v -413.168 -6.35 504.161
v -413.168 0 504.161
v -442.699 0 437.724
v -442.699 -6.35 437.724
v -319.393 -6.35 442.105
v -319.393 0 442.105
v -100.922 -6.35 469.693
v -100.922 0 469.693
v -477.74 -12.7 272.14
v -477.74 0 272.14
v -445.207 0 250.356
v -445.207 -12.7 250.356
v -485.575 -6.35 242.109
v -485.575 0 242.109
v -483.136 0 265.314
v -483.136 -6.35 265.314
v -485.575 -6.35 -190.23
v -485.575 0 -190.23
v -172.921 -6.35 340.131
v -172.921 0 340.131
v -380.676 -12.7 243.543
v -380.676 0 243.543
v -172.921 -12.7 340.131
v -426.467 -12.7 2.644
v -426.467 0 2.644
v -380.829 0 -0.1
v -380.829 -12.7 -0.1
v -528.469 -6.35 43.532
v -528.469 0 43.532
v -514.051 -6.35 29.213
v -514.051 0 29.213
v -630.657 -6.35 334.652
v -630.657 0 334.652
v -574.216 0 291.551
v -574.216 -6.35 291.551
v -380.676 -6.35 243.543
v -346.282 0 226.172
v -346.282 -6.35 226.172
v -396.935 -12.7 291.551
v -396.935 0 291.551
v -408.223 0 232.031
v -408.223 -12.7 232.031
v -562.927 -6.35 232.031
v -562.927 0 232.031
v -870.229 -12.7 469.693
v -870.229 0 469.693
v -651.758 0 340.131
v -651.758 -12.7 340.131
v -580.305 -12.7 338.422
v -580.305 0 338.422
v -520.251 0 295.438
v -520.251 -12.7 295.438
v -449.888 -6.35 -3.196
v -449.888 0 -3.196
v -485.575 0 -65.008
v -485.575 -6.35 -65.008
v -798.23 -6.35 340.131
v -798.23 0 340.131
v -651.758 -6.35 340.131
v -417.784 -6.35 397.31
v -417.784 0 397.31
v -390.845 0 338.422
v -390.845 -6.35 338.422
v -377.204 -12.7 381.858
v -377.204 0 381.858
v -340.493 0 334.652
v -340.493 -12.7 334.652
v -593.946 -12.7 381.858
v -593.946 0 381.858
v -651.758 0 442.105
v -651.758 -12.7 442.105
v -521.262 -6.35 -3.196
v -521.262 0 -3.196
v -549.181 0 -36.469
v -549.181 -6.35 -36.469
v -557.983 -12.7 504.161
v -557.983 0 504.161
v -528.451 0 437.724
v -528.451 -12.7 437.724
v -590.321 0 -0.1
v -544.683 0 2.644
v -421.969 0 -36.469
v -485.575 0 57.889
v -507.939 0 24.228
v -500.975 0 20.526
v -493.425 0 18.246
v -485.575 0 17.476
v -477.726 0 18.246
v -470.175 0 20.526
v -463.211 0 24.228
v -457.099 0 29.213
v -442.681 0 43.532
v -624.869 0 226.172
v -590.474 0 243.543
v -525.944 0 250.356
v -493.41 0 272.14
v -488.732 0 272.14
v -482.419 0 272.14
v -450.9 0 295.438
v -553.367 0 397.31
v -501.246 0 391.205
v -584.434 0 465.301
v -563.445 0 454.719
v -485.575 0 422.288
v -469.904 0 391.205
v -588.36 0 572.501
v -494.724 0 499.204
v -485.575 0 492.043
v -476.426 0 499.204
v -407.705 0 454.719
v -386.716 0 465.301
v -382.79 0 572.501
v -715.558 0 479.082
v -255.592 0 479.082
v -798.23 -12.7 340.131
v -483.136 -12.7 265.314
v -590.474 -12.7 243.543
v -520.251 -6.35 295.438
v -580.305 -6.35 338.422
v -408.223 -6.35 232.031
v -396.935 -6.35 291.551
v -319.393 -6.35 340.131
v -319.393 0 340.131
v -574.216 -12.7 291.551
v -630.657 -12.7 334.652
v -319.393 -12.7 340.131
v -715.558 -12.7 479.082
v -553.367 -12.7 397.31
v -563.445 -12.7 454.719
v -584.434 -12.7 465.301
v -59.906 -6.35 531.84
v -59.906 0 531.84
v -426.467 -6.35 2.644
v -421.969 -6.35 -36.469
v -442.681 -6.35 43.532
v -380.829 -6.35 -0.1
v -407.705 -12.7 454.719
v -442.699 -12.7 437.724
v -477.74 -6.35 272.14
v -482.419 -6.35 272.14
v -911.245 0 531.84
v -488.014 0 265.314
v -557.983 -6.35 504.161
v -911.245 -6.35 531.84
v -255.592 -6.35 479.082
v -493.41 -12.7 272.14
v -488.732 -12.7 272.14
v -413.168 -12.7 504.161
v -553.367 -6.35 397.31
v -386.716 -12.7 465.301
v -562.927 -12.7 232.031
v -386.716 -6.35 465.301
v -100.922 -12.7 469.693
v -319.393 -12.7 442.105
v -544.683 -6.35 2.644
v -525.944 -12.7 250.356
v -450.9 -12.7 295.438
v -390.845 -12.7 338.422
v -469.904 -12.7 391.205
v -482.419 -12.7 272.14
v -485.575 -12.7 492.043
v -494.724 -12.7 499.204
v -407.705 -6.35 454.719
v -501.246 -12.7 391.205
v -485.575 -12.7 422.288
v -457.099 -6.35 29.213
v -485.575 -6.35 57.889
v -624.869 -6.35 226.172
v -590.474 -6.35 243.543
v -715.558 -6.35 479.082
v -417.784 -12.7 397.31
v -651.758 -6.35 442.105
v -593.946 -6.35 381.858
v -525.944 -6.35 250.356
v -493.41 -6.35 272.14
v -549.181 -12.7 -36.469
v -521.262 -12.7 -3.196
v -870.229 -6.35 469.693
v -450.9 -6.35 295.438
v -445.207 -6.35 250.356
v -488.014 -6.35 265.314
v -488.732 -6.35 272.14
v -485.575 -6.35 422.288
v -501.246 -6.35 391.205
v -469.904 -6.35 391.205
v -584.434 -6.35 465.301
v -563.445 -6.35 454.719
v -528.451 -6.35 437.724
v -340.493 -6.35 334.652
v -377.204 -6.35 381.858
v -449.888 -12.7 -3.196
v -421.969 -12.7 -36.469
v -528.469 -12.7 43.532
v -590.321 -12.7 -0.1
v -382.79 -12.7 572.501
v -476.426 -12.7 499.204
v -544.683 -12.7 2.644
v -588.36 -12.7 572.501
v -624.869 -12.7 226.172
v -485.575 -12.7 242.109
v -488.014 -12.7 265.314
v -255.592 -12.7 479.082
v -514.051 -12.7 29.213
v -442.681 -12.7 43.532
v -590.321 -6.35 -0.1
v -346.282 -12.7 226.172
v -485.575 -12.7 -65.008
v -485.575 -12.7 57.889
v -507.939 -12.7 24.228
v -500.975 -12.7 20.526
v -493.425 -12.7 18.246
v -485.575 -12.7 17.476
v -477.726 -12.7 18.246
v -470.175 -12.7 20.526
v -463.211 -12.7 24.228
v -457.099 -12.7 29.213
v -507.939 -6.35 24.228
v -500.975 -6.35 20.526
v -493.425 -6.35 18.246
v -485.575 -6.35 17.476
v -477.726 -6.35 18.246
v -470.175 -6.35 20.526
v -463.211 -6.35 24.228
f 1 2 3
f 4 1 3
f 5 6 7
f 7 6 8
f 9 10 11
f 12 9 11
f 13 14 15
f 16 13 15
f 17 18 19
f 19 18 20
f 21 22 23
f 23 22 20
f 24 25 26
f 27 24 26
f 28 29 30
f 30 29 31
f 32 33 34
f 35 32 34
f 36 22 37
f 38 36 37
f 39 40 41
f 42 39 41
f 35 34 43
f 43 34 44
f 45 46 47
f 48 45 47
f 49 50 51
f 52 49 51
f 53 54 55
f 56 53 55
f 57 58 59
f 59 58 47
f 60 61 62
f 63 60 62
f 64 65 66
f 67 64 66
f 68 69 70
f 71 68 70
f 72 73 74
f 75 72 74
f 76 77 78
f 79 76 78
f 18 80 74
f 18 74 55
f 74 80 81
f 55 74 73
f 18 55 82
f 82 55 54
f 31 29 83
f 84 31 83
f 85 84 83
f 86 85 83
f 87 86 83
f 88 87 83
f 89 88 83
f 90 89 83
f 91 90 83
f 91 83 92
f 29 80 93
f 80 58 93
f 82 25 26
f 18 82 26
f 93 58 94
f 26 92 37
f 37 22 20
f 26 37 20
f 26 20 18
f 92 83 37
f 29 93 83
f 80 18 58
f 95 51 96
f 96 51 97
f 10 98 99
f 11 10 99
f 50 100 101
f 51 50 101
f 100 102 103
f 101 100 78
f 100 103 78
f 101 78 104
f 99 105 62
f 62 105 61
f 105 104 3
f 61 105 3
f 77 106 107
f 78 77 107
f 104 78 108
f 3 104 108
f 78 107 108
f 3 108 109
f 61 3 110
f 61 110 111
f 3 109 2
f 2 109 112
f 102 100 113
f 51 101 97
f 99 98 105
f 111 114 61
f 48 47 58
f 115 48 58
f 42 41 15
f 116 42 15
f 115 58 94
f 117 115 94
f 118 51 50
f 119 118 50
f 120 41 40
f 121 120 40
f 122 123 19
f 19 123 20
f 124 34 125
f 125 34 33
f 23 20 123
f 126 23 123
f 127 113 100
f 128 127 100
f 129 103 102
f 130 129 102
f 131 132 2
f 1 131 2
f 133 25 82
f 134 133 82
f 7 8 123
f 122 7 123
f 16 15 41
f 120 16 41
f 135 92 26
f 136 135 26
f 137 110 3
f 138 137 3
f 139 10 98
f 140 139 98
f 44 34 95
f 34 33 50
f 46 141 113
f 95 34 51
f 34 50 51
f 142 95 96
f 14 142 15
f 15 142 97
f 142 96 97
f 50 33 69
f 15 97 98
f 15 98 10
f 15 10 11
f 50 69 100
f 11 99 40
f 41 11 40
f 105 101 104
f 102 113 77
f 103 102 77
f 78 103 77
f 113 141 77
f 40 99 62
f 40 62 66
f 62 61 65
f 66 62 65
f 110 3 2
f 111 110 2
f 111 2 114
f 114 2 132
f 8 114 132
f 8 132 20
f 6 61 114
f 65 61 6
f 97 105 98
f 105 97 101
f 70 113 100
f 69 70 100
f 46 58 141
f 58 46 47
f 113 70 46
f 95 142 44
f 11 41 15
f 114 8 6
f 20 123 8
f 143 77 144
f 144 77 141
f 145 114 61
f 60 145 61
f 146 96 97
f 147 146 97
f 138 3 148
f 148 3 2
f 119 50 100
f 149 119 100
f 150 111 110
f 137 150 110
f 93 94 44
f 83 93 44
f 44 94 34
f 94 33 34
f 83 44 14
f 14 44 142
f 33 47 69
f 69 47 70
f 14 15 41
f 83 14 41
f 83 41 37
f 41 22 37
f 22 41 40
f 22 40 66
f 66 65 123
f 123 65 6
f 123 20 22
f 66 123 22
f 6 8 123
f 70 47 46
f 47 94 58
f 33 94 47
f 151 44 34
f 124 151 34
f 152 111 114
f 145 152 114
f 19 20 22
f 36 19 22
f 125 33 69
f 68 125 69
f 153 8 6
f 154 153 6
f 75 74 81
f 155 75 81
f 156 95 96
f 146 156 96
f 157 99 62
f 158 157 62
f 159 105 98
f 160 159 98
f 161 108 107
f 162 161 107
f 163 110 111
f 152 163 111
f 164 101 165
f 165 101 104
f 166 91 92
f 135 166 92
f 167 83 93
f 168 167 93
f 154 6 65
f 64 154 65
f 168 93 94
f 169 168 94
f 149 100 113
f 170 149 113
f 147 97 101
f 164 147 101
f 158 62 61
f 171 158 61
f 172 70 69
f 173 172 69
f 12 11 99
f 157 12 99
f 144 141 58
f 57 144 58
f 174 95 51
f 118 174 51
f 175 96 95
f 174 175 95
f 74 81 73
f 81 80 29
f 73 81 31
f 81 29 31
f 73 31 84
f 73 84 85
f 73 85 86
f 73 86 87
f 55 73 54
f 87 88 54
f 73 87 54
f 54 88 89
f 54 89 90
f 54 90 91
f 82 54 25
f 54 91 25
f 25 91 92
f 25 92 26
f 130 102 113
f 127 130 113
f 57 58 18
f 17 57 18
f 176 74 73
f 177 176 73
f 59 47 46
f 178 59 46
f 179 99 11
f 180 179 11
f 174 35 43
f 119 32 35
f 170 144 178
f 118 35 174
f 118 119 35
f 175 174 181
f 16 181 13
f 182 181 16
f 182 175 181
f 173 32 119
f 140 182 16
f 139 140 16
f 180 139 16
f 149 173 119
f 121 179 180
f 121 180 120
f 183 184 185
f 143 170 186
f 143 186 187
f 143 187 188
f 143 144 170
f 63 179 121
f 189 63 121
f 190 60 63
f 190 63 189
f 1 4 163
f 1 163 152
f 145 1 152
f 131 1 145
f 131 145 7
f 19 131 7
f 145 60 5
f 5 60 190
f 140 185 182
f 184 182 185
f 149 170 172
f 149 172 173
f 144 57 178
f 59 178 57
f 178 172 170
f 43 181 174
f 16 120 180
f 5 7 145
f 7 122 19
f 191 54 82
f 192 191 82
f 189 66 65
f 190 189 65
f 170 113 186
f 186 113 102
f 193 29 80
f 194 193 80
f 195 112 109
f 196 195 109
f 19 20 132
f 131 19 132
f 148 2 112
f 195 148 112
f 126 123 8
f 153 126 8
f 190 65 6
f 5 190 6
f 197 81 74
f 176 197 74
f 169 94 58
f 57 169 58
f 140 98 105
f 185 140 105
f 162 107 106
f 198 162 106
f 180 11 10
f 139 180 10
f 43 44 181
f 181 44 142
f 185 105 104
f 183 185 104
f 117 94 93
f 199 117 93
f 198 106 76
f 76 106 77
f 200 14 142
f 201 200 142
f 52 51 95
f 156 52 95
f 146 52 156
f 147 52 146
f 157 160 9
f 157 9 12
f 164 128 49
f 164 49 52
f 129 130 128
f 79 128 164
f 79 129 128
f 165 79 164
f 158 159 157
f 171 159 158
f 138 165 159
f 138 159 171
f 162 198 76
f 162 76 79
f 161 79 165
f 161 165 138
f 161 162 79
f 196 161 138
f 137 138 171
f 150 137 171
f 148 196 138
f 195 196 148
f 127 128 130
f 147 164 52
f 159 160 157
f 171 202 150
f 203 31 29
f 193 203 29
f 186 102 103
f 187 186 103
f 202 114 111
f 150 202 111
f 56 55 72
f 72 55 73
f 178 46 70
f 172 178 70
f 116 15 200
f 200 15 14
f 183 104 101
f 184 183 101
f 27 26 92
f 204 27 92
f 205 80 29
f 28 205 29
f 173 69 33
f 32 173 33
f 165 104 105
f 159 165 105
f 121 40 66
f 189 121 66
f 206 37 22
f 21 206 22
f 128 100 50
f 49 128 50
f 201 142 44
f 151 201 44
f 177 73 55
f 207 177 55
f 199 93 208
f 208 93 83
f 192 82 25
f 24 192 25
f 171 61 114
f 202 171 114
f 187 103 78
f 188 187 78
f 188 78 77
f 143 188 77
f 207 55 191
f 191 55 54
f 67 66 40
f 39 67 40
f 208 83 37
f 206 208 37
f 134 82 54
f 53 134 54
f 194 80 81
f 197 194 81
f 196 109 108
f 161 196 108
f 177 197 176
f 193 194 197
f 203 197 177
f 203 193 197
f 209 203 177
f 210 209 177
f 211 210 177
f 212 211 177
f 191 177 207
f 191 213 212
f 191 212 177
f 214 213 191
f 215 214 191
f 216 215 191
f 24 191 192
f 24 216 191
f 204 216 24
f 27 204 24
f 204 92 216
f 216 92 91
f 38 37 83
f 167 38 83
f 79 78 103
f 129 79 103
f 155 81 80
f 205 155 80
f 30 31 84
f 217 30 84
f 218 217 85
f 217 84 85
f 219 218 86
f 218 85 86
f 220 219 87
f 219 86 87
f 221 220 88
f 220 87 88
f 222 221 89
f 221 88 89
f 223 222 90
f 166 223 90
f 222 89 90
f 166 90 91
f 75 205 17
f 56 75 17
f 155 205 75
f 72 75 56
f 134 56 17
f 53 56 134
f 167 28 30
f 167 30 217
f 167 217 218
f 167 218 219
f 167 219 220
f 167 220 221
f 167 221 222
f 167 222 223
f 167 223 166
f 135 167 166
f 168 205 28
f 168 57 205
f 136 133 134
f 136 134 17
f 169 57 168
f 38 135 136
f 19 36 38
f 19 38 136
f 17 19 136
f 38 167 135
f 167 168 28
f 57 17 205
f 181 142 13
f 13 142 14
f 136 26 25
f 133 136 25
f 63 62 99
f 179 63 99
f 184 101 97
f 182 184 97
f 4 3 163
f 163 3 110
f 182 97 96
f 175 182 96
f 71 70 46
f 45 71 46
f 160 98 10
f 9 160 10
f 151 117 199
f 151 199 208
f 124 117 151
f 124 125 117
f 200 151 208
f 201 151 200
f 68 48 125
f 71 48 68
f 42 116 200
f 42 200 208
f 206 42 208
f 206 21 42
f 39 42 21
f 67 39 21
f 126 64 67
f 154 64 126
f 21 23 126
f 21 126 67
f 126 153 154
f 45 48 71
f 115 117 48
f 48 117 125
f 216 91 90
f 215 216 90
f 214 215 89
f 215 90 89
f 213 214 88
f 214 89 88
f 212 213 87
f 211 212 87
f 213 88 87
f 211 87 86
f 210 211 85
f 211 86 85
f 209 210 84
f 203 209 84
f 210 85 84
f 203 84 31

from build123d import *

# Parameters (mm, degrees)
F1_DEPTH = 6.35
F2_DEPTH = 12.7


with BuildPart() as f1:
    # F0 (on Front) → F1 (new body)
    with BuildSketch(Plane.XZ):
        Polygon((-485.5751420818, -190.2299884788), (-172.9206451465, 340.130851128), (-380.6757926941, 243.5427904129), (-346.2815037892, 226.1720895767), (-485.5751420818, 57.8887422456), (-624.8687803745, 226.1720895767), (-590.4744914696, 243.5427904129), (-798.2296390172, 340.130851128), align=None)
        with BuildLine():
            Line((-449.8881420818, -3.1962913091), (-485.5751420818, -65.0079884788))
            Line((-485.5751420818, -65.0079884788), (-521.2621420818, -3.1962913091))
            Line((-521.2621420818, -3.1962913091), (-549.180979121, -36.4686656515))
            Line((-549.180979121, -36.4686656515), (-544.6832078992, 2.643569698))
            Line((-544.6832078992, 2.643569698), (-590.3208287346, -0.0997794377))
            Line((-590.3208287346, -0.0997794377), (-528.4694970898, 43.5315354378))
            Line((-528.4694970898, 43.5315354378), (-514.0510197234, 29.2133682914))
            ThreePointArc((-514.0510197234, 29.2133682914), (-485.5751420818, 17.4764584835), (-457.0992644403, 29.2133682914))
            Line((-457.0992644403, 29.2133682914), (-442.6807870739, 43.5315354378))
            Line((-442.6807870739, 43.5315354378), (-380.8294554291, -0.0997794377))
            Line((-380.8294554291, -0.0997794377), (-426.4670762645, 2.643569698))
            Line((-426.4670762645, 2.643569698), (-421.9693050427, -36.4686656515))
            Line((-421.9693050427, -36.4686656515), (-449.8881420818, -3.1962913091))
        make_face(mode=Mode.SUBTRACT)
    extrude(amount=F1_DEPTH)


with BuildPart() as f1b:
    # F0 (on Front) → F1, piece 2 (new body)
    with BuildSketch(Plane.XZ):
        Polygon((-172.9206451465, 340.130851128), (-59.9057547382, 531.8398230204), (-413.167752041, 504.1609113641), (-442.6994789512, 437.7238548981), (-407.7049196339, 454.7187798673), (-386.7164137088, 465.3005182942), (-255.5917930773, 479.0822712702), (-417.7836477757, 397.3102867603), (-390.8452568724, 338.421885956), (-450.8996789181, 295.4383105375), (-445.2067492678, 250.3562617189), (-477.7398109436, 272.1401154995), (-482.4187469524, 272.1401154995), (-483.136191916, 265.3140826404), (-408.2230004371, 232.0314205909), (-396.9347151817, 291.5514863754), (-340.4932591022, 334.6522308612), (-377.2042264194, 381.8577982212), (-319.3926513195, 442.1046674252), (-100.9215166589, 469.6930497821), (-319.3926513195, 340.130851128), align=None)
        Polygon((-911.2445294255, 531.8398230204), (-798.2296390172, 340.130851128), (-651.7576328442, 340.130851128), (-870.2287675048, 469.6930497821), (-651.7576328442, 442.1046674252), (-593.9460577443, 381.8577982212), (-630.6570250615, 334.6522308612), (-574.215568982, 291.5514863754), (-562.9272837265, 232.0314205909), (-488.0140922477, 265.3140826404), (-488.7315372112, 272.1401154995), (-493.4104732201, 272.1401154995), (-525.9435348959, 250.3562617189), (-520.2506052456, 295.4383105375), (-580.3050272913, 338.421885956), (-553.366636388, 397.3102867603), (-715.5584910864, 479.0822712702), (-584.4338704548, 465.3005182942), (-563.4453645297, 454.7187798673), (-528.4508052125, 437.7238548981), (-557.9825321227, 504.1609113641), align=None)
        Polygon((-485.5751420818, 242.1090218769), (-483.136191916, 265.3140826404), (-482.4187469524, 272.1401154995), (-469.9044798054, 391.2054140143), (-485.5751420818, 422.2876213768), (-501.2458043583, 391.2054140143), (-488.7315372112, 272.1401154995), (-488.0140922477, 265.3140826404), align=None)
    extrude(amount=F1_DEPTH)


with BuildPart() as f2:
    # F0 (on Front) → F2 (new body)
    with BuildSketch(Plane.XZ):
        Polygon((-442.6994789512, 437.7238548981), (-413.167752041, 504.1609113641), (-476.4264261655, 499.2044448719), (-485.5751420818, 492.043023193), (-494.7238579982, 499.2044448719), (-557.9825321227, 504.1609113641), (-528.4508052125, 437.7238548981), (-563.4453645297, 454.7187798673), (-584.4338704548, 465.3005182942), (-715.5584910864, 479.0822712702), (-553.366636388, 397.3102867603), (-580.3050272913, 338.421885956), (-520.2506052456, 295.4383105375), (-525.9435348959, 250.3562617189), (-493.4104732201, 272.1401154995), (-488.7315372112, 272.1401154995), (-501.2458043583, 391.2054140143), (-485.5751420818, 422.2876213768), (-469.9044798054, 391.2054140143), (-482.4187469524, 272.1401154995), (-477.7398109436, 272.1401154995), (-445.2067492678, 250.3562617189), (-450.8996789181, 295.4383105375), (-390.8452568724, 338.421885956), (-417.7836477757, 397.3102867603), (-255.5917930773, 479.0822712702), (-386.7164137088, 465.3005182942), (-407.7049196339, 454.7187798673), align=None)
        Polygon((-476.4264261655, 499.2044448719), (-413.167752041, 504.1609113641), (-382.7901326724, 572.5009586441), align=None)
        Polygon((-557.9825321227, 504.1609113641), (-494.7238579982, 499.2044448719), (-588.3601514913, 572.5009586441), align=None)
    extrude(amount=F2_DEPTH)


with BuildPart() as f2b:
    # F0 (on Front) → F2, piece 2 (new body)
    with BuildSketch(Plane.XZ):
        with BuildLine():
            Line((-521.2621420818, -3.1962913091), (-485.5751420818, -65.0079884788))
            Line((-485.5751420818, -65.0079884788), (-449.8881420818, -3.1962913091))
            Line((-449.8881420818, -3.1962913091), (-421.9693050427, -36.4686656515))
            Line((-421.9693050427, -36.4686656515), (-426.4670762645, 2.643569698))
            Line((-426.4670762645, 2.643569698), (-380.8294554291, -0.0997794377))
            Line((-380.8294554291, -0.0997794377), (-442.6807870739, 43.5315354378))
            Line((-442.6807870739, 43.5315354378), (-457.0992644403, 29.2133682914))
            ThreePointArc((-457.0992644403, 29.2133682914), (-485.5751420818, 17.4764584835), (-514.0510197234, 29.2133682914))
            Line((-514.0510197234, 29.2133682914), (-528.4694970898, 43.5315354378))
            Line((-528.4694970898, 43.5315354378), (-590.3208287346, -0.0997794377))
            Line((-590.3208287346, -0.0997794377), (-544.6832078992, 2.643569698))
            Line((-544.6832078992, 2.643569698), (-549.180979121, -36.4686656515))
            Line((-549.180979121, -36.4686656515), (-521.2621420818, -3.1962913091))
        make_face()
    extrude(amount=F2_DEPTH)


with BuildPart() as f2c:
    # F0 (on Front) → F2, piece 3 (new body)
    with BuildSketch(Plane.XZ):
        Polygon((-380.6757926941, 243.5427904129), (-172.9206451465, 340.130851128), (-319.3926513195, 340.130851128), (-100.9215166589, 469.6930497821), (-319.3926513195, 442.1046674252), (-377.2042264194, 381.8577982212), (-340.4932591022, 334.6522308612), (-396.9347151817, 291.5514863754), (-408.2230004371, 232.0314205909), (-483.136191916, 265.3140826404), (-485.5751420818, 242.1090218769), (-488.0140922477, 265.3140826404), (-562.9272837265, 232.0314205909), (-574.215568982, 291.5514863754), (-630.6570250615, 334.6522308612), (-593.9460577443, 381.8577982212), (-651.7576328442, 442.1046674252), (-870.2287675048, 469.6930497821), (-651.7576328442, 340.130851128), (-798.2296390172, 340.130851128), (-590.4744914696, 243.5427904129), (-624.8687803745, 226.1720895767), (-485.5751420818, 57.8887422456), (-346.2815037892, 226.1720895767), align=None)
    extrude(amount=F2_DEPTH)


solid = Compound([f1.part, f1b.part, f2.part, f2b.part, f2c.part])
